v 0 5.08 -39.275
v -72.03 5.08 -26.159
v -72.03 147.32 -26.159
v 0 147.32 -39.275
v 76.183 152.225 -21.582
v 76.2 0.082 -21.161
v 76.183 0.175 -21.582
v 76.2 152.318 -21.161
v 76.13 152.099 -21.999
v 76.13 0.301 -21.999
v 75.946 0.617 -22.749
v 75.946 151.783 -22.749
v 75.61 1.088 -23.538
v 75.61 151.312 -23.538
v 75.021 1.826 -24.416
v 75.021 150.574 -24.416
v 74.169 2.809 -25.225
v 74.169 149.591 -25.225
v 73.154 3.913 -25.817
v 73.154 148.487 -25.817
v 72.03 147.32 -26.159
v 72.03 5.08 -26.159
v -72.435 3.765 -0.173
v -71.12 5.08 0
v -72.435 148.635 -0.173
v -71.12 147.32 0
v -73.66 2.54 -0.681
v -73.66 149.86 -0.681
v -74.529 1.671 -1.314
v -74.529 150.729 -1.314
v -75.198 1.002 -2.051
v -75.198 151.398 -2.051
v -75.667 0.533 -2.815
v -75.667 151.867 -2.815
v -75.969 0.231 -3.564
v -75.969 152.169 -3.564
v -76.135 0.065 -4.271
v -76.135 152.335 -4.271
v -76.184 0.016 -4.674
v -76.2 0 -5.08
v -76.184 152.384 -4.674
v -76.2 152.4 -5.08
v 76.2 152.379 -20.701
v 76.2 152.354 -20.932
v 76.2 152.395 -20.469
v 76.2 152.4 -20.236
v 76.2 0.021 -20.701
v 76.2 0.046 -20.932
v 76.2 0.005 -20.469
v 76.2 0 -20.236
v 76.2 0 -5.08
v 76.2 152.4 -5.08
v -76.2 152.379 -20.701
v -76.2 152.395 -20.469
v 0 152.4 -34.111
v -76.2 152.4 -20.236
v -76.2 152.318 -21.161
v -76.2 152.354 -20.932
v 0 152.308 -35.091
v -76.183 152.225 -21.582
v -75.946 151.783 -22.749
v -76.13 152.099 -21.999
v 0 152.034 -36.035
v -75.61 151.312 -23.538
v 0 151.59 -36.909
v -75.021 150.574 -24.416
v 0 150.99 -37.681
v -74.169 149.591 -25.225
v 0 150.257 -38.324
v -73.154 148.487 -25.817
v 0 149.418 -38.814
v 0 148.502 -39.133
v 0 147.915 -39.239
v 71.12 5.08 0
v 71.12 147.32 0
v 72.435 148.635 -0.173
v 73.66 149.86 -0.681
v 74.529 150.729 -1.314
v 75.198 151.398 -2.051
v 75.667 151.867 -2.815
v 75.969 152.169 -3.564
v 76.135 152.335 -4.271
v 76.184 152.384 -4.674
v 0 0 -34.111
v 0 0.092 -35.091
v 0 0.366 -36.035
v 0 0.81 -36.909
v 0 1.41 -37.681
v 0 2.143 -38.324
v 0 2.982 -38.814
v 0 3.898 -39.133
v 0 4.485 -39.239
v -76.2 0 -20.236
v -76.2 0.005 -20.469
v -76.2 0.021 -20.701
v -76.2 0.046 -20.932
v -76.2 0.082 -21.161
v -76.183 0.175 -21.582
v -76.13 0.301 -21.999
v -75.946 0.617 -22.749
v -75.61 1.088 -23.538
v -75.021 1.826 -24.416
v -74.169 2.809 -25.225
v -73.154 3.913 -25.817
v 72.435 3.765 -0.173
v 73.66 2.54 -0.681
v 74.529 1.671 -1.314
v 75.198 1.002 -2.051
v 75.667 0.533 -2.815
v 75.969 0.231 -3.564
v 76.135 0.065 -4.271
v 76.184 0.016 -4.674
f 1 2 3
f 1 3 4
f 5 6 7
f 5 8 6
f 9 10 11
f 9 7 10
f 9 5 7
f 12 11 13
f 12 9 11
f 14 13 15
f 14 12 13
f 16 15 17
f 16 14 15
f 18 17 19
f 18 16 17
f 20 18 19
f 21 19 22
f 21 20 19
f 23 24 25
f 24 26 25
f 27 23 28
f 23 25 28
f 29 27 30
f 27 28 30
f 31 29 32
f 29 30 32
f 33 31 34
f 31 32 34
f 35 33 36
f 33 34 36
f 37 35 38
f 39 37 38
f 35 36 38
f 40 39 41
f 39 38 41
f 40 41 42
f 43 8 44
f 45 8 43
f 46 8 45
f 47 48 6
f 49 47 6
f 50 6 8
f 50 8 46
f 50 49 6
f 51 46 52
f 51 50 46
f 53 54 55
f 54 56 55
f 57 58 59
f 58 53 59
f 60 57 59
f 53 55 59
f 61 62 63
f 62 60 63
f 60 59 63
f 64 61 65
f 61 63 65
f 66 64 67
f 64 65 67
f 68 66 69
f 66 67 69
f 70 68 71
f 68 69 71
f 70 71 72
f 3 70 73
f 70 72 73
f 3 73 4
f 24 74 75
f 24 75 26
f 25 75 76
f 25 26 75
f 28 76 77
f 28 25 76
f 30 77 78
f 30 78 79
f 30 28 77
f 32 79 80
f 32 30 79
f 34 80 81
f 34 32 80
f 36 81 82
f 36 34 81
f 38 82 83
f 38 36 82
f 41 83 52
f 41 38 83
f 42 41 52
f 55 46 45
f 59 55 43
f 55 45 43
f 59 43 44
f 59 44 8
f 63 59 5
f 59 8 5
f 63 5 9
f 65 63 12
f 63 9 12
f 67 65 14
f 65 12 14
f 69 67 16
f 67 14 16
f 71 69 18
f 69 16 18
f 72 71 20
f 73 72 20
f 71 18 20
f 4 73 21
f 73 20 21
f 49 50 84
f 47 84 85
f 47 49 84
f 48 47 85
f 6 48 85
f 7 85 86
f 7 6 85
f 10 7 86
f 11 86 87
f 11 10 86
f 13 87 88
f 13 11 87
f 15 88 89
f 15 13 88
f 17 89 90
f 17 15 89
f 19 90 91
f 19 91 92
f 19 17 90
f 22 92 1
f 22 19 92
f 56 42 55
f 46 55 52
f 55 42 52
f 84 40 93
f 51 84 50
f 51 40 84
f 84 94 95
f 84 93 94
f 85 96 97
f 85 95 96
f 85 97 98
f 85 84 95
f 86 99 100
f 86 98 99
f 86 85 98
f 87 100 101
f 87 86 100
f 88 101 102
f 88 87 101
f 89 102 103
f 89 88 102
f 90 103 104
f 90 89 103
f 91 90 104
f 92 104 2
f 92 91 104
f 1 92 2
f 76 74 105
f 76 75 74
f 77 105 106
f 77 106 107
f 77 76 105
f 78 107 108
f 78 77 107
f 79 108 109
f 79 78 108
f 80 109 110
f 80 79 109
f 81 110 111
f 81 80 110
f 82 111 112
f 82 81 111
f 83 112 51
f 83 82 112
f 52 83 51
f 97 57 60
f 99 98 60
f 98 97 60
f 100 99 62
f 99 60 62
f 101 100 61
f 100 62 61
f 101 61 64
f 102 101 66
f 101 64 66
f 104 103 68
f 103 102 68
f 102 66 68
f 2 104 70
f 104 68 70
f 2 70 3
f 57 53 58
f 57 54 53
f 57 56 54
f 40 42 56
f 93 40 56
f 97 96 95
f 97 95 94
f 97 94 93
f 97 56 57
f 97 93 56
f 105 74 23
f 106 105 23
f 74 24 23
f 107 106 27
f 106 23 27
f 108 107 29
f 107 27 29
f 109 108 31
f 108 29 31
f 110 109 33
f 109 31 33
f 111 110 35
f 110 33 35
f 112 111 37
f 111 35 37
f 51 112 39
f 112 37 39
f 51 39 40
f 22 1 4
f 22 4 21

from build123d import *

# Parameters (mm, degrees)
F1_DEPTH = 152.4
F2_R     = 5.08
F3_R     = 5.08


with BuildPart() as f1:
    # F0 (on Front) → F1 (new body)
    with BuildSketch(Plane.XZ):
        Polygon((76.2, 0), (0, 0), (-76.2, 0), (-76.2, -25.4), (0, -39.274979), (76.2, -25.4), align=None)
    extrude(amount=-F1_DEPTH)

    # F2
    f2_edges = [f1.edges().sort_by_distance(p)[0] for p in [
        (76.2, 76.2, 0),
        (0, 152.4, 0),
        (-76.2, 76.2, 0),
        (0, 0, 0),
    ]]
    fillet(f2_edges, radius=F2_R)

    # F3
    f3_edges = [f1.edges().sort_by_distance(p)[0] for p in [
        (76.2, 76.2, -25.4),
        (38.1, 0, -32.33749),
        (-38.1, 0, -32.33749),
        (38.1, 152.4, -32.33749),
        (-38.1, 152.4, -32.33749),
        (-76.2, 76.2, -25.4),
    ]]
    fillet(f3_edges, radius=F3_R)


solid = f1.part
